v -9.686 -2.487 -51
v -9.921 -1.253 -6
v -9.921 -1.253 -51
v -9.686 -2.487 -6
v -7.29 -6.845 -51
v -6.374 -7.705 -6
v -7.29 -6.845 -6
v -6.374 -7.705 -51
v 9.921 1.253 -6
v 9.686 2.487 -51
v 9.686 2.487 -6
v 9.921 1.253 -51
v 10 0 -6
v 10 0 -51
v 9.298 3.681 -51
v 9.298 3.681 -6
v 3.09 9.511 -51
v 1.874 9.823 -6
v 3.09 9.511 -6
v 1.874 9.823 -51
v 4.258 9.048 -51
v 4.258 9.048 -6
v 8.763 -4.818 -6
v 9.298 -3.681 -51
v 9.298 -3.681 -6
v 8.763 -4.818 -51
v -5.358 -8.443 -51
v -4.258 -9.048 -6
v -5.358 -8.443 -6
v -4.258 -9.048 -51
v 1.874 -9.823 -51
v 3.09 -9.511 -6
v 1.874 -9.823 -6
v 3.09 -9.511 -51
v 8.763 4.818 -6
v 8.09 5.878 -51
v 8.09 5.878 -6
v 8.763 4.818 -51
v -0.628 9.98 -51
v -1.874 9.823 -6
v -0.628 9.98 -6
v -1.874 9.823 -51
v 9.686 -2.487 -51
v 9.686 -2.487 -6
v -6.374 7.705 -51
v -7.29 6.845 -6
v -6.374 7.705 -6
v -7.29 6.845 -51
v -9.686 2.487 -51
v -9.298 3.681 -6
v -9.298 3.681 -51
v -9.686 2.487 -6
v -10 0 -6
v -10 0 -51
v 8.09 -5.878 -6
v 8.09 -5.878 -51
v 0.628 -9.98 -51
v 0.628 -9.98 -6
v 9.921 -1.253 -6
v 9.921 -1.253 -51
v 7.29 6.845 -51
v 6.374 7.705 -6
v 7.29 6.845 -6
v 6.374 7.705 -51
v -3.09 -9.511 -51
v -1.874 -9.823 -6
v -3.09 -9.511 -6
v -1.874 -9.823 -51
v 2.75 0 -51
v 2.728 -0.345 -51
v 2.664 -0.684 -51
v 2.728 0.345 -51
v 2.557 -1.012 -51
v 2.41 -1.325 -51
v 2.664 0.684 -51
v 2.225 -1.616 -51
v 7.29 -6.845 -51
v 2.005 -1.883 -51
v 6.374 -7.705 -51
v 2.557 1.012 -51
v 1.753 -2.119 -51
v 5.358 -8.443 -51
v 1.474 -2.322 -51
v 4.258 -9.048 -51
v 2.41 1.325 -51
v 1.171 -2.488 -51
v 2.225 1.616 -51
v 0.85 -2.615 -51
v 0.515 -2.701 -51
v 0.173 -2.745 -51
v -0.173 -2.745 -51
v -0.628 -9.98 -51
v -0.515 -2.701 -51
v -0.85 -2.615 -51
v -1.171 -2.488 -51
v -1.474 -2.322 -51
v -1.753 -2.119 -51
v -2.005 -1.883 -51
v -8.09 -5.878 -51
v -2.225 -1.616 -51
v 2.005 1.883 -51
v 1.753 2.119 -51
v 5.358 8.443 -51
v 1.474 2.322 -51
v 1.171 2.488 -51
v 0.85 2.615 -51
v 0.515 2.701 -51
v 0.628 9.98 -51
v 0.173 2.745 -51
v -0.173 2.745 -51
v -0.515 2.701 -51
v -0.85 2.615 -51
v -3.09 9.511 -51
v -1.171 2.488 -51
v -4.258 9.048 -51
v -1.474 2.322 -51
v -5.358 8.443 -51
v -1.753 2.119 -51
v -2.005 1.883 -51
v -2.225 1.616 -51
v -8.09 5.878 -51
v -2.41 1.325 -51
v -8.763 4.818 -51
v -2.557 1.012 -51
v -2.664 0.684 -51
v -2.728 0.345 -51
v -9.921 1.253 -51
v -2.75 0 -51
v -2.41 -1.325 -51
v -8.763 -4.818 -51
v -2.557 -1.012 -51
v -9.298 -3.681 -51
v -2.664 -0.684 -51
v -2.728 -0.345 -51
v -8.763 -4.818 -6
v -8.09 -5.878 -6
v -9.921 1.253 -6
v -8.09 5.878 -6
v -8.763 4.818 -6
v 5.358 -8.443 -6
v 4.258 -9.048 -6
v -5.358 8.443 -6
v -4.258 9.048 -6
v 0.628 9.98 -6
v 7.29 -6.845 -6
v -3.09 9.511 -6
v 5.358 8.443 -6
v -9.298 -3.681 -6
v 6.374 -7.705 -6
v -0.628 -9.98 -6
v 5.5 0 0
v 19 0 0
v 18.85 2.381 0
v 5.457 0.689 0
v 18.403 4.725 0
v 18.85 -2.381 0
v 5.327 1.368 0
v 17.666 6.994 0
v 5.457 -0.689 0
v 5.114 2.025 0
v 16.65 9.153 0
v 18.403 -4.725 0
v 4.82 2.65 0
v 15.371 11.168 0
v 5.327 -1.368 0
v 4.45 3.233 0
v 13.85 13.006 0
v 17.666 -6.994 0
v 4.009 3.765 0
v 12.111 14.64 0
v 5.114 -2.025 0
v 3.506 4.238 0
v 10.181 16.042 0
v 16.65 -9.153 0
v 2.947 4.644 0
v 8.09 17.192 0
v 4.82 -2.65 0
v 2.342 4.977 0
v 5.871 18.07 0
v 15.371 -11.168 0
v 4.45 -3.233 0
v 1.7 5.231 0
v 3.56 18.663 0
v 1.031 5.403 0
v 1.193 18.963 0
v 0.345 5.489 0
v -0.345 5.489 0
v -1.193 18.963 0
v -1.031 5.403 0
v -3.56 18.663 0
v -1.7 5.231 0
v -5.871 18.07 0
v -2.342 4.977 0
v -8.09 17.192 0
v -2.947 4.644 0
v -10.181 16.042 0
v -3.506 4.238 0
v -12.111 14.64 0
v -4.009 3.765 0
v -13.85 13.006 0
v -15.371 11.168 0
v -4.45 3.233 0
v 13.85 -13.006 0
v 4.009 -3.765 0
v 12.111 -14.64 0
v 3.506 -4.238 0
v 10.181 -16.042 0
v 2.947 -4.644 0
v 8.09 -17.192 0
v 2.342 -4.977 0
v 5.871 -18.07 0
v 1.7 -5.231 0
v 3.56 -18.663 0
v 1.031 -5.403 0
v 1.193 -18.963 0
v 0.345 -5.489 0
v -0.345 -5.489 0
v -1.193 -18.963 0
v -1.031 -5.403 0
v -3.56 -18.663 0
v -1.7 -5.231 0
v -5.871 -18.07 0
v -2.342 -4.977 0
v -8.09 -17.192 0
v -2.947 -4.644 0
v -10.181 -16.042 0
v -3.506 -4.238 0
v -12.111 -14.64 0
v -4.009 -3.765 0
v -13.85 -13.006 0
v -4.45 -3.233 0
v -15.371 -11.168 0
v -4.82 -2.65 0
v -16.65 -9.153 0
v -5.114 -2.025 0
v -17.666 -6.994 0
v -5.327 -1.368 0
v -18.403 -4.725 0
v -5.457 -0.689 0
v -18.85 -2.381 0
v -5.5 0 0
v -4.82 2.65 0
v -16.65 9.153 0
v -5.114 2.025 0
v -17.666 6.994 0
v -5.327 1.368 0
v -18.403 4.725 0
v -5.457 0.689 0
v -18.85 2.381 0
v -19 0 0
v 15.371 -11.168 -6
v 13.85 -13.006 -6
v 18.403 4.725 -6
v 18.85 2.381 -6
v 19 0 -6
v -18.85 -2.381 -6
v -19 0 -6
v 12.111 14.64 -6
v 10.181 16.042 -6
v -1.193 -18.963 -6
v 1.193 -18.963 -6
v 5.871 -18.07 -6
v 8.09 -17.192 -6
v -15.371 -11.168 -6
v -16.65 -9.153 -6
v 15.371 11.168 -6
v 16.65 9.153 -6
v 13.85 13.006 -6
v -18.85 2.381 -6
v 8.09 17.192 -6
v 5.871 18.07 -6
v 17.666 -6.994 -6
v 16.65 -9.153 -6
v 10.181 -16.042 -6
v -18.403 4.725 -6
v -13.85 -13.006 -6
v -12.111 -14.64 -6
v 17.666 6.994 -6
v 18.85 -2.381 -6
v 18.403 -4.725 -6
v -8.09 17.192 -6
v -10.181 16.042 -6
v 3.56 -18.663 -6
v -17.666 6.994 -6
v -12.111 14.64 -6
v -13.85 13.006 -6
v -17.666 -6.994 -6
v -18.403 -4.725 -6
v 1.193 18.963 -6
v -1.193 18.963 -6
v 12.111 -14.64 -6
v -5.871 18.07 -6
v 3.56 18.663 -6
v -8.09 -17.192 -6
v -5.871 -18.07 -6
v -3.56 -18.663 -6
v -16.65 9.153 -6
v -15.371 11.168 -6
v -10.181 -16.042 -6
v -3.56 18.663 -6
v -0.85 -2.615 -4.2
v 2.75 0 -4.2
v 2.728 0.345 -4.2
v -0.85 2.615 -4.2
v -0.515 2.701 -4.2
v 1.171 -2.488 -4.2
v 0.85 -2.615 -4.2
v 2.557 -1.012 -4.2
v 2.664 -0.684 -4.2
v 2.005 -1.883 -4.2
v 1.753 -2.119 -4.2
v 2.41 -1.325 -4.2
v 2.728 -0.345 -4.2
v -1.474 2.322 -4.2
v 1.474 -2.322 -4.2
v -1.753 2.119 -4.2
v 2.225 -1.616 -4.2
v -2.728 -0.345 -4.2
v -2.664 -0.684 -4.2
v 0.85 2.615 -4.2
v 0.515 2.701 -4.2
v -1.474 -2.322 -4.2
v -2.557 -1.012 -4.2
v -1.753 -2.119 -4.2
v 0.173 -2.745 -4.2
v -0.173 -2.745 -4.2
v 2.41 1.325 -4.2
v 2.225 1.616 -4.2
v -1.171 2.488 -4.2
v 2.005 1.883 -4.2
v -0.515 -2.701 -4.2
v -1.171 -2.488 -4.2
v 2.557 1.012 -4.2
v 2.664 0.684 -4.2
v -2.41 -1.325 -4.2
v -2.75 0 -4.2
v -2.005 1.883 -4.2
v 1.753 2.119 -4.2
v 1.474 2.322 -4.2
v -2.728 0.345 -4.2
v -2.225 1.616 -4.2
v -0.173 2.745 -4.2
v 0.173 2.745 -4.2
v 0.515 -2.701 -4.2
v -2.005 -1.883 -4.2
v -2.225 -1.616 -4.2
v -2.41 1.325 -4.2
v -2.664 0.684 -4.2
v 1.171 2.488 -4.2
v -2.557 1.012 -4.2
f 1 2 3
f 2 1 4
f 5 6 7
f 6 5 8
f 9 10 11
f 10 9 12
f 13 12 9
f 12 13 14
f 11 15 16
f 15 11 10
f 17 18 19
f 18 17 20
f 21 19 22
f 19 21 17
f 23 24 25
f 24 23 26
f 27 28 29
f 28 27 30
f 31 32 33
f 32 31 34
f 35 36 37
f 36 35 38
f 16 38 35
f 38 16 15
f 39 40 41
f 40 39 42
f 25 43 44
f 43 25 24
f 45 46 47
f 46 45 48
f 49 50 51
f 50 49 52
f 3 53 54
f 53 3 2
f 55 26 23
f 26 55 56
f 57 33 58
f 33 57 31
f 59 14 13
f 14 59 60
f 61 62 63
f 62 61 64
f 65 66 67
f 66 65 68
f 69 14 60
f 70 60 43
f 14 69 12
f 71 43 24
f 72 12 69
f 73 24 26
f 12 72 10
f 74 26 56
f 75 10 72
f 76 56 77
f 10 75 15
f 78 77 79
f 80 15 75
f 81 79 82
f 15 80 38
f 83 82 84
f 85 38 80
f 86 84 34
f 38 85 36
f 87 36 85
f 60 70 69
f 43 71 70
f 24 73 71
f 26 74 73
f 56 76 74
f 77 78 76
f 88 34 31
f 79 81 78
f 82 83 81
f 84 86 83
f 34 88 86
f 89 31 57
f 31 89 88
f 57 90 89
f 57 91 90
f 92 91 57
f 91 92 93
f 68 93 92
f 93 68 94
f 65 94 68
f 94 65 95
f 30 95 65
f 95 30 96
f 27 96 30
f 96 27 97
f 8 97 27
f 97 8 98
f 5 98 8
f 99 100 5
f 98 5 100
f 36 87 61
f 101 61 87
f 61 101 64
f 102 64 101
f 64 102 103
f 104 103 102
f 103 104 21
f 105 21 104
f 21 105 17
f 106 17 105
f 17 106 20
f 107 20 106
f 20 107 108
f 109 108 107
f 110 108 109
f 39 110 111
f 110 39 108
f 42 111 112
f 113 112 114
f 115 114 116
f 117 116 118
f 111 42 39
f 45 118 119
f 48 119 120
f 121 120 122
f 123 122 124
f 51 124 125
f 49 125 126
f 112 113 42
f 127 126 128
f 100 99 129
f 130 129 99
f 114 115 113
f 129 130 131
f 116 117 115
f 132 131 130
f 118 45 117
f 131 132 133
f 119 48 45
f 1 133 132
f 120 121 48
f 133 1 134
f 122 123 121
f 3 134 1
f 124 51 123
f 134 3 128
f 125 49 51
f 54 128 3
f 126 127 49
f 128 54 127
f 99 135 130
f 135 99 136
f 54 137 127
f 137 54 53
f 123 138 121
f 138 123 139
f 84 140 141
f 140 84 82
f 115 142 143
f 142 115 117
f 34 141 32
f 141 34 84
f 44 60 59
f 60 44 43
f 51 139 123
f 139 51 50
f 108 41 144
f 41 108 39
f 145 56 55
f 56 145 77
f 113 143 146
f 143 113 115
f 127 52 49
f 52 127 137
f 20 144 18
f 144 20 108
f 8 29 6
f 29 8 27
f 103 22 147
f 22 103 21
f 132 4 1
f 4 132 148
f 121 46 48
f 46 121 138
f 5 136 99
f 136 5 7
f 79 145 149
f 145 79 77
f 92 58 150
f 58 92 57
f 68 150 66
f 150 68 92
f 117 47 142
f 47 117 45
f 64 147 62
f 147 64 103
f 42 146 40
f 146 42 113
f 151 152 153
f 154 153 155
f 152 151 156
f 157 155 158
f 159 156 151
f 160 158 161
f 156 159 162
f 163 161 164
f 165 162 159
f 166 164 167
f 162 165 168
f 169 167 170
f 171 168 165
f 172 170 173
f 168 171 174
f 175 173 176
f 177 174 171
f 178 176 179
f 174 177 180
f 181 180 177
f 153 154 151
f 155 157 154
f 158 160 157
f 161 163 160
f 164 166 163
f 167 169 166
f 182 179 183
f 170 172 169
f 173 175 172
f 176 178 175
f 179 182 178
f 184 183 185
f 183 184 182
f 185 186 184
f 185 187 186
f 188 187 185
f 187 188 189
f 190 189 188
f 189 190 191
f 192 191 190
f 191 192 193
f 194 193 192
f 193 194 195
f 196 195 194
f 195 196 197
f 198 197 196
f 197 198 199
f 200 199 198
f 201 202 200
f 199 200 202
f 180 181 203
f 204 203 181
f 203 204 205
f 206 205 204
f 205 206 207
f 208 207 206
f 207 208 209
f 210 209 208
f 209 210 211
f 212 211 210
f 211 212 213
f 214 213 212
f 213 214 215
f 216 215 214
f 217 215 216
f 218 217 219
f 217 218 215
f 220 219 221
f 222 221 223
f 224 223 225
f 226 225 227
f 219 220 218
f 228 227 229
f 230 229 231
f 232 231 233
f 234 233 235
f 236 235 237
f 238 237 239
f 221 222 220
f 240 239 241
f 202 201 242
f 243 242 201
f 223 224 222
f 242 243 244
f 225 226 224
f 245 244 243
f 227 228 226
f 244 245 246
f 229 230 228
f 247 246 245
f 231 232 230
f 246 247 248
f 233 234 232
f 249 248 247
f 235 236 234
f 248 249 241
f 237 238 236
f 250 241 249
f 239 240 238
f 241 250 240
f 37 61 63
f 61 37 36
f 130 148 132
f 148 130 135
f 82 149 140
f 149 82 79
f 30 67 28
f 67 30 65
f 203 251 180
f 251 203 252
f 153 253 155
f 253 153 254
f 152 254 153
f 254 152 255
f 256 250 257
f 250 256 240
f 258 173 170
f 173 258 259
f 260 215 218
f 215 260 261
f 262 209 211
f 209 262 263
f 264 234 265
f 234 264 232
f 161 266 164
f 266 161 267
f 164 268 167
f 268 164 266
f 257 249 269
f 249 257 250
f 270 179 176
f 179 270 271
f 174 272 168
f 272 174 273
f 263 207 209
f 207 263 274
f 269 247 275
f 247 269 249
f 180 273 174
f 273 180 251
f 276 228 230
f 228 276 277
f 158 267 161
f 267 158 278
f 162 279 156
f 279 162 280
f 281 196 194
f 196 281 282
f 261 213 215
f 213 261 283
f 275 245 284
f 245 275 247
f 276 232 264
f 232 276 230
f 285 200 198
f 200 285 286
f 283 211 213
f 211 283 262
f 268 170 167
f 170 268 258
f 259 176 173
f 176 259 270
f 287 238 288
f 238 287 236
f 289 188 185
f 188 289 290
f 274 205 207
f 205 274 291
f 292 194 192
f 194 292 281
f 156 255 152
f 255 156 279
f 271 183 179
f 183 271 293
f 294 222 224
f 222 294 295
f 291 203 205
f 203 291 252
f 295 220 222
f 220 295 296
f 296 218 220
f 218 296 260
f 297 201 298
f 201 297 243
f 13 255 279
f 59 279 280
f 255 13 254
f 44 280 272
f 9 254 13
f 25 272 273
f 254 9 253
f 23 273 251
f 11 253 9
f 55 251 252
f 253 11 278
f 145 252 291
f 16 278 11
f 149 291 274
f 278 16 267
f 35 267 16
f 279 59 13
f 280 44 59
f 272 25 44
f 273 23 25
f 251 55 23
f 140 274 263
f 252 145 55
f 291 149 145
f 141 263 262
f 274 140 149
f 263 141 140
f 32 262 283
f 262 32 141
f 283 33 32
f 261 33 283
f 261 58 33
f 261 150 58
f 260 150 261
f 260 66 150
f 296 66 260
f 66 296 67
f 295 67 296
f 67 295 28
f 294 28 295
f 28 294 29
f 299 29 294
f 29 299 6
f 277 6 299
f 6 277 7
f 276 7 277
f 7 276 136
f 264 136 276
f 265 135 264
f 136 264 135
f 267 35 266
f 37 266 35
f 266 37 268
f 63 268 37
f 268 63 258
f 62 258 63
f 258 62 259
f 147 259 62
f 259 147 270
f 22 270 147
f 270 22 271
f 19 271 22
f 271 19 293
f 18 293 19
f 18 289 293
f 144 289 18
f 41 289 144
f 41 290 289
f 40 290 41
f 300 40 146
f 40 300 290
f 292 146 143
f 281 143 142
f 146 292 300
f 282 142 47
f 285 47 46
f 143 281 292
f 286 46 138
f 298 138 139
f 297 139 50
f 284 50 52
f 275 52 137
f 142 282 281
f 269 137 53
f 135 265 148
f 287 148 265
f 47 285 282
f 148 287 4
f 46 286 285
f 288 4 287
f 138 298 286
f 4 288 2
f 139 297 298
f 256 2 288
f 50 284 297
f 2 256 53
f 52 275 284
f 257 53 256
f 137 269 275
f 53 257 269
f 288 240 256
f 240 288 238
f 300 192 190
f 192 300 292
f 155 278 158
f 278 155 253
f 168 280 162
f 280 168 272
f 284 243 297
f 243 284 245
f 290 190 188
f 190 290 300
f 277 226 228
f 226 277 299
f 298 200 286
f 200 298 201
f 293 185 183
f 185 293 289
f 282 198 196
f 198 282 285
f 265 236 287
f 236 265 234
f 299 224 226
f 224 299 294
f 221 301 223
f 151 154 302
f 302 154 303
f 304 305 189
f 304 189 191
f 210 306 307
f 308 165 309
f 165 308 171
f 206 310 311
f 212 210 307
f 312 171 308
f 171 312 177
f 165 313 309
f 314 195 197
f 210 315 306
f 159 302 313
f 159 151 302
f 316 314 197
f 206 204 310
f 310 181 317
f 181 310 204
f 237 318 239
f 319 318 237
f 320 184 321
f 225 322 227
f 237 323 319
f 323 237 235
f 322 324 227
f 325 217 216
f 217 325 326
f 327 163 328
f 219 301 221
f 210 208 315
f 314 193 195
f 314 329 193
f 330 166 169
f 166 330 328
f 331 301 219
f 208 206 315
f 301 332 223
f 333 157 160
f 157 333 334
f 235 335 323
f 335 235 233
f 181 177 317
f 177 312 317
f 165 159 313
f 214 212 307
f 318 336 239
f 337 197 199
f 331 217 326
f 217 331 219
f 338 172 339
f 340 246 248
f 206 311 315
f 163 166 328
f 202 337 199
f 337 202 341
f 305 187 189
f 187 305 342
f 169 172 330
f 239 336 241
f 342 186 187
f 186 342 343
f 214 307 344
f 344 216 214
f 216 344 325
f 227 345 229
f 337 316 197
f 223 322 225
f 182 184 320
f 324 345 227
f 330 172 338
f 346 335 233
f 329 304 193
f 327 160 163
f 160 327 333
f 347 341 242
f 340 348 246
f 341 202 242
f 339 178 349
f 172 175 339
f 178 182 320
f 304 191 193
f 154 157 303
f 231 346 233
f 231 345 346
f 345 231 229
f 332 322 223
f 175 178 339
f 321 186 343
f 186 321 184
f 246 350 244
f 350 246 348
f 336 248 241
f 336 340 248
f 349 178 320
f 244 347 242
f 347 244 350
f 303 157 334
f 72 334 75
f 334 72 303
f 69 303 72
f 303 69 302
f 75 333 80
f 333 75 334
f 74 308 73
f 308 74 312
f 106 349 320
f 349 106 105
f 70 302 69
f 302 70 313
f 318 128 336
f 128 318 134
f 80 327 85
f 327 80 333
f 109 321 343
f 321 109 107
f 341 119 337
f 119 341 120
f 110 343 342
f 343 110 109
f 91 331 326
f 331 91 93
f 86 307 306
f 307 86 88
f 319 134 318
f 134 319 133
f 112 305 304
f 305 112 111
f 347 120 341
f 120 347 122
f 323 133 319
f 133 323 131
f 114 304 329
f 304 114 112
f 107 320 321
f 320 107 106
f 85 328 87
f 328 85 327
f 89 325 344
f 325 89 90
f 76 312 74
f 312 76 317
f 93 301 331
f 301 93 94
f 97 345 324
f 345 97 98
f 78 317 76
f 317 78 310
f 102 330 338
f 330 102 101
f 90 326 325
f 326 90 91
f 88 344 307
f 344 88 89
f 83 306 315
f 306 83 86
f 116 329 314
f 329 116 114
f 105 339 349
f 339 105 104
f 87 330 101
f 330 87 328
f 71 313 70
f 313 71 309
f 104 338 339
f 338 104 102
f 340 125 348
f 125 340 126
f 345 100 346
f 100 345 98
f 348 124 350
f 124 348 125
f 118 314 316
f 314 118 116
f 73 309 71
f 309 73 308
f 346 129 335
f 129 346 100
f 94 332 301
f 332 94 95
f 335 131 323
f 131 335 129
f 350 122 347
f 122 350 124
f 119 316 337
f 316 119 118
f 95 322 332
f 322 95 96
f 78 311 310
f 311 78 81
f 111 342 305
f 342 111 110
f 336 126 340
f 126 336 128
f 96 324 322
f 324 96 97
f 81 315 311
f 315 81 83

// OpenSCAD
$fn = 50;


difference() {
	union() {
		translate(v = [0, 0, -51.0000000000]) {
			cylinder(h = 51, r = 10.0000000000);
		}
		translate(v = [0, 0, -6.0000000000]) {
			cylinder(h = 6, r = 19.0000000000);
		}
	}
	union() {
		translate(v = [0, 0, 0]) {
			rotate(a = [0, 0, 0]) {
				difference() {
					union() {
						#translate(v = [0, 0, -51.0000000000]) {
							cylinder(h = 51, r = 2.2500000000);
						}
						#translate(v = [0, 0, -4.2000000000]) {
							cylinder(h = 4.2000000000, r = 10.0000000000, r1 = 2.7500000000, r2 = 5.5000000000);
						}
						#translate(v = [0, 0, -51.0000000000]) {
							cylinder(h = 51, r = 2.7500000000);
						}
						#translate(v = [0, 0, -51.0000000000]) {
							cylinder(h = 51, r = 2.2500000000);
						}
					}
					union();
				}
			}
		}
	}
}
